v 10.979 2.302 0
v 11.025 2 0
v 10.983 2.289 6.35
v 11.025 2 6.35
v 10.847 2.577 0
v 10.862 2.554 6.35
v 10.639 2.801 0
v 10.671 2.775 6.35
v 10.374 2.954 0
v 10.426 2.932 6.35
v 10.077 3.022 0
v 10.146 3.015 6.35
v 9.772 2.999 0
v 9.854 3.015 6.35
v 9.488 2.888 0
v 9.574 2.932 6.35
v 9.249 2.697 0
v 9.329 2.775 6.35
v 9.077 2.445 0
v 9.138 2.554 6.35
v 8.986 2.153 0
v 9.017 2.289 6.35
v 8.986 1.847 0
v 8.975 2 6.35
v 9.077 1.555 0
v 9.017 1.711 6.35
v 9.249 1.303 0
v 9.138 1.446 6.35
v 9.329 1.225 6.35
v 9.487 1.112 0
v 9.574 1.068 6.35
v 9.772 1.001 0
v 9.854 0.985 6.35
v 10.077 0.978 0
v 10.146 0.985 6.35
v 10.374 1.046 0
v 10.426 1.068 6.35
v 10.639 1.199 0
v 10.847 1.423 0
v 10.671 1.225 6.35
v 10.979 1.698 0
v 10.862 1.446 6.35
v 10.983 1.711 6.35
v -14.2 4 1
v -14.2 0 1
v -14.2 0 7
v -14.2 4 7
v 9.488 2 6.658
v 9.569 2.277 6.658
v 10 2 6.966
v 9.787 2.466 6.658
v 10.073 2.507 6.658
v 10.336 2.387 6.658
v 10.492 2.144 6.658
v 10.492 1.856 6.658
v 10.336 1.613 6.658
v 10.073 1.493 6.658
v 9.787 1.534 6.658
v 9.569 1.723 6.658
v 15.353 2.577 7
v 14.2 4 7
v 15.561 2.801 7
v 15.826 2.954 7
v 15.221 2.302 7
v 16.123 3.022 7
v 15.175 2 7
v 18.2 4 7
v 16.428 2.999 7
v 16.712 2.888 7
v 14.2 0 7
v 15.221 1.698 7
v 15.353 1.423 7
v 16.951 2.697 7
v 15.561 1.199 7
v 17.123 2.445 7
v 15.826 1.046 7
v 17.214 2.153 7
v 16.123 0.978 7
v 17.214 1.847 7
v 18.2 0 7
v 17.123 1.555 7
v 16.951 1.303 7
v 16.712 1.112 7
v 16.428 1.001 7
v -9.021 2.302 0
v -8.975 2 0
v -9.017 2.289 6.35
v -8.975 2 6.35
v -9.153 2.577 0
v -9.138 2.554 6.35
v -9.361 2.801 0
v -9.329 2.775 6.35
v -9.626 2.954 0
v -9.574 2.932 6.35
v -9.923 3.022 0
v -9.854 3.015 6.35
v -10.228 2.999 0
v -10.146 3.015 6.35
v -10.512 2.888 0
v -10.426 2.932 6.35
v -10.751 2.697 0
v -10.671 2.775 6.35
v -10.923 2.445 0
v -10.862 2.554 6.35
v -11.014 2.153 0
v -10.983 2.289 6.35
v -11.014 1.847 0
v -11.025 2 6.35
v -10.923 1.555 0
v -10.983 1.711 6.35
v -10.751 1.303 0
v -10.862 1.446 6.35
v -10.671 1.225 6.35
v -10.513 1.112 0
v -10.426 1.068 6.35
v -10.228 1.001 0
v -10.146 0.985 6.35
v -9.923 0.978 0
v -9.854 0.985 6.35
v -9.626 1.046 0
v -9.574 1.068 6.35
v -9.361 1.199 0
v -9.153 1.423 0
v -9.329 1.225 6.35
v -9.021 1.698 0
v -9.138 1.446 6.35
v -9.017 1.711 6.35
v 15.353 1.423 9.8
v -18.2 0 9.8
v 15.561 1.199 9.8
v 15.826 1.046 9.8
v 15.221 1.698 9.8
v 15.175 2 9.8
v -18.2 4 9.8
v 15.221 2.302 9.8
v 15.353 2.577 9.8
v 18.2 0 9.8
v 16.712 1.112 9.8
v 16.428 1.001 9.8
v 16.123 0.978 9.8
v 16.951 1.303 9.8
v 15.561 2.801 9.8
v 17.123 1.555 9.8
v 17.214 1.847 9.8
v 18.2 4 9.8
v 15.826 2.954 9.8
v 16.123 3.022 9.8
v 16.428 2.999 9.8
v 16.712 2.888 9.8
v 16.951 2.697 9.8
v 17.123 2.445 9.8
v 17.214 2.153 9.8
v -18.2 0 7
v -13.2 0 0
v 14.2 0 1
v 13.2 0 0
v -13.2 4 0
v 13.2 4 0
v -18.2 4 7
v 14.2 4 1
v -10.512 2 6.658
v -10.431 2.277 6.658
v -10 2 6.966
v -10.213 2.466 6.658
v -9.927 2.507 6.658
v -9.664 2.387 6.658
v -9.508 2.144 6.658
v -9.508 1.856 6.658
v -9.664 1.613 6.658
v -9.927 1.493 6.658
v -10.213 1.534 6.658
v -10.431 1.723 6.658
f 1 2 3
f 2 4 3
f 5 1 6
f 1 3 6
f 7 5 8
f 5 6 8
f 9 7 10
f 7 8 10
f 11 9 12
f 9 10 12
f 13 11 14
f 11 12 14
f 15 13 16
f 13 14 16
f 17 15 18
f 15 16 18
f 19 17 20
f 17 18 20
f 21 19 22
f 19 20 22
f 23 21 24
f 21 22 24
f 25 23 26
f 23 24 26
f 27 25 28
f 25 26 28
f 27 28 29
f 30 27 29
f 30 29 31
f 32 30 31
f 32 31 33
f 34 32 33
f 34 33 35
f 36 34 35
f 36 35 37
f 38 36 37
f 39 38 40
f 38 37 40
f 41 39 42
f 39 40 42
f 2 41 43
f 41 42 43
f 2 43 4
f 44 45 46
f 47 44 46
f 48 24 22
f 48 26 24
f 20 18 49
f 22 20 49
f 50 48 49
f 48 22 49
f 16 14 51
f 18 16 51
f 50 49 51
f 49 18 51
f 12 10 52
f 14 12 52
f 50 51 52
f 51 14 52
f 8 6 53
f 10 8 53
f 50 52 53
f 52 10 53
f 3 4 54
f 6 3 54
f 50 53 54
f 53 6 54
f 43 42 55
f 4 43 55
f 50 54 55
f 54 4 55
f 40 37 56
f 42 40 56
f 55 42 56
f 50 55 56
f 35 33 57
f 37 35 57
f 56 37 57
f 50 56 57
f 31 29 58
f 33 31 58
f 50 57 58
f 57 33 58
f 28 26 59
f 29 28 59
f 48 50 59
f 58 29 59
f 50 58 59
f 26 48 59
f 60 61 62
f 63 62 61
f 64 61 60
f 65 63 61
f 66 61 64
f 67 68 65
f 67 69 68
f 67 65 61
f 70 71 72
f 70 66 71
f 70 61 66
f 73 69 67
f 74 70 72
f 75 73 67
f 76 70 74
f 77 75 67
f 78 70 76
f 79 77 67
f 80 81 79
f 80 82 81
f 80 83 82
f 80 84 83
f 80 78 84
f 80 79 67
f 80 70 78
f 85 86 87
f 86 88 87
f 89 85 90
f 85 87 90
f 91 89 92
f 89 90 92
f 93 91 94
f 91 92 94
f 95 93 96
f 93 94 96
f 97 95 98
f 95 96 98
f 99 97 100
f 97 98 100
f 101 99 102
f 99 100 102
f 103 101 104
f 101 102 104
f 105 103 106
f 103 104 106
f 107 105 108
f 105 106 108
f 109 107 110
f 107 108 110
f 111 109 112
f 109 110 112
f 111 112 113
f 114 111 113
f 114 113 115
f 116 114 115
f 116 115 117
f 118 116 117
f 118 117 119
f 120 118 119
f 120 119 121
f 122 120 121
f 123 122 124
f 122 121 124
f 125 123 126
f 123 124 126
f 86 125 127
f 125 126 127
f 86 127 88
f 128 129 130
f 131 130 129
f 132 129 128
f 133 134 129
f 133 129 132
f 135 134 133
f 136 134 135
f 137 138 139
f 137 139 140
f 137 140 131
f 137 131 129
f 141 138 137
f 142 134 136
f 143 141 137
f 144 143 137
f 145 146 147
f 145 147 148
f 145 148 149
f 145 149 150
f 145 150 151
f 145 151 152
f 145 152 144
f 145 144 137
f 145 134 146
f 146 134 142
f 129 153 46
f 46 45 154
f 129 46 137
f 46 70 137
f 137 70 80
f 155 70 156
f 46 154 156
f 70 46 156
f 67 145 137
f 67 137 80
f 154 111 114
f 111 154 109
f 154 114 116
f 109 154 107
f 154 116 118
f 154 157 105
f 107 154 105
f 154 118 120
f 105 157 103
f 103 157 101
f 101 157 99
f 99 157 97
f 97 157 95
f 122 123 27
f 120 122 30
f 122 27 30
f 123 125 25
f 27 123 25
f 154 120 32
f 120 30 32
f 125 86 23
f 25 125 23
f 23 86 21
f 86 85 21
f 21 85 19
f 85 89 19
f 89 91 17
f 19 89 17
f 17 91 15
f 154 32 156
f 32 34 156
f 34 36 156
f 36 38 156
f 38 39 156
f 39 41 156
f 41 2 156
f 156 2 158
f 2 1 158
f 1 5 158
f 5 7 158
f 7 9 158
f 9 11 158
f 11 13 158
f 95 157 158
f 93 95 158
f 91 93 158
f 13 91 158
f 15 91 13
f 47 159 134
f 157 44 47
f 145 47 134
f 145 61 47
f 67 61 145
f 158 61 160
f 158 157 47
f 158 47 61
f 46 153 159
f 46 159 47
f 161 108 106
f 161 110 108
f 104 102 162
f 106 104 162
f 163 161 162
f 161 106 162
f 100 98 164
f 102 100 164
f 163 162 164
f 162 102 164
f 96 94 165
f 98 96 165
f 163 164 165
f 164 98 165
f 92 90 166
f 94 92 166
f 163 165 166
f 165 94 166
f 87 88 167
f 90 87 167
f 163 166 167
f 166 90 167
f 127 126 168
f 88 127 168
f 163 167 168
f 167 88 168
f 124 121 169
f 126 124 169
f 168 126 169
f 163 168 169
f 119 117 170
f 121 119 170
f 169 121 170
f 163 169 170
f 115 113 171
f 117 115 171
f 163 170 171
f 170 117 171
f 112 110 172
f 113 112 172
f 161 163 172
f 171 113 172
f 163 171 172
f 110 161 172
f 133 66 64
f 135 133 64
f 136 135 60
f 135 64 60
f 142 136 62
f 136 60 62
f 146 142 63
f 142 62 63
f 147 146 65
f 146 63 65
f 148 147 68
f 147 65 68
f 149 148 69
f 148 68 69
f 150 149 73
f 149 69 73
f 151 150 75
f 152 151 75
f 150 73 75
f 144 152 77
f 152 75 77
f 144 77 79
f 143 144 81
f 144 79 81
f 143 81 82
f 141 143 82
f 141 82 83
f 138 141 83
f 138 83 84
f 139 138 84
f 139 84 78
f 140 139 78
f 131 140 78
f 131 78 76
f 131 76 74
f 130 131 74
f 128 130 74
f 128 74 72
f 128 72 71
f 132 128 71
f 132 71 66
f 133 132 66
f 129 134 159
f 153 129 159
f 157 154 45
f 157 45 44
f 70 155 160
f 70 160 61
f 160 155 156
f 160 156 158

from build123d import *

# Parameters (mm, degrees)
SKETCH1_W                        = 36.4
SKETCH1_H                        = 9.8
BOSS_EXTRUDE1_DEPTH              = 4
SKETCH2_W                        = 4
SKETCH2_H                        = 6.999999999
CUT_EXTRUDE1_DEPTH               = 5
SKETCH3_W                        = 4
SKETCH3_H                        = 6.999999999
CUT_EXTRUDE2_DEPTH               = 5
F_2_05_2_05_DIAMETER_HOLE1_D     = 2.05
F_2_05_2_05_DIAMETER_HOLE1_DEPTH = 6.35
F_2_05_2_05_DIAMETER_HOLE1_TIP   = 0.615882135
F_2_05_2_05_DIAMETER_HOLE2_D     = 2.05
F_2_05_2_05_DIAMETER_HOLE2_DEPTH = 9.8
CHAMFER1_SIZE                    = 1


with BuildPart() as part:
    # Sketch1 → Boss-Extrude1 (new body)
    with BuildSketch(Plane(origin=(0, 4, 0), x_dir=(1, 0, 0), z_dir=(0, 1, 0))):
        with Locations((0, -4.9)):
            Rectangle(SKETCH1_W, SKETCH1_H)
    extrude(amount=-BOSS_EXTRUDE1_DEPTH)

    # Sketch2 → Cut-Extrude1 (cut, through all)
    with BuildSketch(Plane.XZ):
        with Locations((-16.2, 3.5)):
            Rectangle(SKETCH2_W, SKETCH2_H)
    extrude(amount=-CUT_EXTRUDE1_DEPTH, mode=Mode.SUBTRACT)

    # Sketch3 → Cut-Extrude2 (cut, through all)
    with BuildSketch(Plane.XZ):
        with Locations((16.2, 3.5)):
            Rectangle(SKETCH3_W, SKETCH3_H)
    extrude(amount=-CUT_EXTRUDE2_DEPTH, mode=Mode.SUBTRACT)

    # Ø2.05 (2.05) Diameter Hole1
    with Locations(Plane(origin=(0, 0, 0), x_dir=(-1, 0, 0), z_dir=(0, 0, -1))):
        with Locations((10, 2), (-10, 2)):
            Hole(F_2_05_2_05_DIAMETER_HOLE1_D / 2, depth=F_2_05_2_05_DIAMETER_HOLE1_DEPTH)
            with Locations((0, 0, -(F_2_05_2_05_DIAMETER_HOLE1_DEPTH + F_2_05_2_05_DIAMETER_HOLE1_TIP / 2))):  # 118° drill point
                Cone(0, F_2_05_2_05_DIAMETER_HOLE1_D / 2, F_2_05_2_05_DIAMETER_HOLE1_TIP, mode=Mode.SUBTRACT)

    # Ø2.05 (2.05) Diameter Hole2
    with Locations(Plane.XY.offset(9.8)):
        with Locations((16.2, 2)):
            Hole(F_2_05_2_05_DIAMETER_HOLE2_D / 2, depth=F_2_05_2_05_DIAMETER_HOLE2_DEPTH)

    # Chamfer1
    chamfer1_edges = [part.edges().sort_by_distance(p)[0] for p in [
        (-14.2, 2, 0),
        (14.2, 2, 0),
    ]]
    chamfer(chamfer1_edges, length=CHAMFER1_SIZE)


solid = part.part
